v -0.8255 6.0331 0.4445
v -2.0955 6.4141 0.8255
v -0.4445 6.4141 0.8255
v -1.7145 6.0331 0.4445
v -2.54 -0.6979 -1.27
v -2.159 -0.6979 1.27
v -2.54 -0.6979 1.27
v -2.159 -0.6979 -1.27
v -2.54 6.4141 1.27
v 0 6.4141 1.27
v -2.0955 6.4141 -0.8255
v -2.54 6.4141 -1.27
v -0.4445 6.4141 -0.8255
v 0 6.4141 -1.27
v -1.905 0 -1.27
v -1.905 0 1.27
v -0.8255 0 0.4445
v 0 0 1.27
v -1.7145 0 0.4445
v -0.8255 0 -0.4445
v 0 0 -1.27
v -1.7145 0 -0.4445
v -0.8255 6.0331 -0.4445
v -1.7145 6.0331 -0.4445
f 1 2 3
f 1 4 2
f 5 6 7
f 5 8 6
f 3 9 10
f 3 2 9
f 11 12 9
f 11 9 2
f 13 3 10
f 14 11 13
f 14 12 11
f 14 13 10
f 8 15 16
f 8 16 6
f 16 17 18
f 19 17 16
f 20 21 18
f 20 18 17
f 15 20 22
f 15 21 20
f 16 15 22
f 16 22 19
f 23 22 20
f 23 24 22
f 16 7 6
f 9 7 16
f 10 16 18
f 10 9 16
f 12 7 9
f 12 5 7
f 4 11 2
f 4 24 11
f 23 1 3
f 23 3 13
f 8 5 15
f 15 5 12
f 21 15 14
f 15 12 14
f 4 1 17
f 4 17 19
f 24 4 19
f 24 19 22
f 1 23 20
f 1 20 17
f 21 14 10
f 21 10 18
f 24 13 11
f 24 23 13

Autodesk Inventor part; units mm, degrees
ref_plane "YZ Plane" through (0, 0, 0) normal (1, 0, 0) x (0, 1, 0)
ref_plane "XZ Plane" through (0, 0, 0) normal (0, 1, 0) x (-1, 0, 0)
ref_plane "XY Plane" through (0, 0, 0) normal (0, 0, 1) x (1, 0, 0)
sketch "Sketch6" plane through (0, 0, 0) normal (0, 0, 1) x (1, 0, 0)
  line L0 (-2.54, 6.4141) -> (0, 6.4141)
  line L1 (0, 6.4141) -> (0, 0)
  line L2 (0, 0) -> (-1.905, 0)
  line L3 (-1.905, 0) -> (-2.159, -0.6979)
  line L4 (-2.159, -0.6979) -> (-2.54, -0.6979)
  line L5 (-2.54, -0.6979) -> (-2.54, 6.4141)
  dimension "d25" = 2.54
  dimension "d26" = 7.112
  dimension "d27" = 110
  dimension "d28" = 1.905
  dimension "d29" = 0.381
extrude "Extrusion3" add sketch "Sketch6" along normal mid plane 2.54
sketch "Sketch7" plane through (-2.54, 6.4141, -1.27) normal (0, 1, 0) x (1, 0, 0)
  line L0 (0.8255, -0.8255) -> (1.7145, -0.8255)
  line L1 (1.7145, -0.8255) -> (1.7145, -1.7145)
  line L2 (1.7145, -1.7145) -> (0.8255, -1.7145)
  line L3 (0.8255, -1.7145) -> (0.8255, -0.8255)
  line L4 (0.8255, -0.8255) -> (1.7145, -1.7145) construction
  line L5 (1.7145, -0.8255) -> (0.8255, -1.7145) construction
  line L6 (2.54, -2.54) -> (2.54, 0) projected
  line L7 (0, 0) -> (2.54, 0) projected
  point P0 (1.27, -1.27)
  point P1 (1.27, -1.27)
  point P2 (1.27, -1.27)
  point P3 (2.54, -1.27)
  point P4 (1.27, 0)
  dimension "d32" = 0.889
extrude "Extrusion4" cut sketch "Sketch7" against normal through all
chamfer "Chamfer2" distance 0.381 angle 45 4 edges at (-1.27, 6.4141, -0.4445) (-1.7145, 6.4141, 0) (-1.27, 6.4141, 0.4445) (-0.8255, 6.4141, 0)
